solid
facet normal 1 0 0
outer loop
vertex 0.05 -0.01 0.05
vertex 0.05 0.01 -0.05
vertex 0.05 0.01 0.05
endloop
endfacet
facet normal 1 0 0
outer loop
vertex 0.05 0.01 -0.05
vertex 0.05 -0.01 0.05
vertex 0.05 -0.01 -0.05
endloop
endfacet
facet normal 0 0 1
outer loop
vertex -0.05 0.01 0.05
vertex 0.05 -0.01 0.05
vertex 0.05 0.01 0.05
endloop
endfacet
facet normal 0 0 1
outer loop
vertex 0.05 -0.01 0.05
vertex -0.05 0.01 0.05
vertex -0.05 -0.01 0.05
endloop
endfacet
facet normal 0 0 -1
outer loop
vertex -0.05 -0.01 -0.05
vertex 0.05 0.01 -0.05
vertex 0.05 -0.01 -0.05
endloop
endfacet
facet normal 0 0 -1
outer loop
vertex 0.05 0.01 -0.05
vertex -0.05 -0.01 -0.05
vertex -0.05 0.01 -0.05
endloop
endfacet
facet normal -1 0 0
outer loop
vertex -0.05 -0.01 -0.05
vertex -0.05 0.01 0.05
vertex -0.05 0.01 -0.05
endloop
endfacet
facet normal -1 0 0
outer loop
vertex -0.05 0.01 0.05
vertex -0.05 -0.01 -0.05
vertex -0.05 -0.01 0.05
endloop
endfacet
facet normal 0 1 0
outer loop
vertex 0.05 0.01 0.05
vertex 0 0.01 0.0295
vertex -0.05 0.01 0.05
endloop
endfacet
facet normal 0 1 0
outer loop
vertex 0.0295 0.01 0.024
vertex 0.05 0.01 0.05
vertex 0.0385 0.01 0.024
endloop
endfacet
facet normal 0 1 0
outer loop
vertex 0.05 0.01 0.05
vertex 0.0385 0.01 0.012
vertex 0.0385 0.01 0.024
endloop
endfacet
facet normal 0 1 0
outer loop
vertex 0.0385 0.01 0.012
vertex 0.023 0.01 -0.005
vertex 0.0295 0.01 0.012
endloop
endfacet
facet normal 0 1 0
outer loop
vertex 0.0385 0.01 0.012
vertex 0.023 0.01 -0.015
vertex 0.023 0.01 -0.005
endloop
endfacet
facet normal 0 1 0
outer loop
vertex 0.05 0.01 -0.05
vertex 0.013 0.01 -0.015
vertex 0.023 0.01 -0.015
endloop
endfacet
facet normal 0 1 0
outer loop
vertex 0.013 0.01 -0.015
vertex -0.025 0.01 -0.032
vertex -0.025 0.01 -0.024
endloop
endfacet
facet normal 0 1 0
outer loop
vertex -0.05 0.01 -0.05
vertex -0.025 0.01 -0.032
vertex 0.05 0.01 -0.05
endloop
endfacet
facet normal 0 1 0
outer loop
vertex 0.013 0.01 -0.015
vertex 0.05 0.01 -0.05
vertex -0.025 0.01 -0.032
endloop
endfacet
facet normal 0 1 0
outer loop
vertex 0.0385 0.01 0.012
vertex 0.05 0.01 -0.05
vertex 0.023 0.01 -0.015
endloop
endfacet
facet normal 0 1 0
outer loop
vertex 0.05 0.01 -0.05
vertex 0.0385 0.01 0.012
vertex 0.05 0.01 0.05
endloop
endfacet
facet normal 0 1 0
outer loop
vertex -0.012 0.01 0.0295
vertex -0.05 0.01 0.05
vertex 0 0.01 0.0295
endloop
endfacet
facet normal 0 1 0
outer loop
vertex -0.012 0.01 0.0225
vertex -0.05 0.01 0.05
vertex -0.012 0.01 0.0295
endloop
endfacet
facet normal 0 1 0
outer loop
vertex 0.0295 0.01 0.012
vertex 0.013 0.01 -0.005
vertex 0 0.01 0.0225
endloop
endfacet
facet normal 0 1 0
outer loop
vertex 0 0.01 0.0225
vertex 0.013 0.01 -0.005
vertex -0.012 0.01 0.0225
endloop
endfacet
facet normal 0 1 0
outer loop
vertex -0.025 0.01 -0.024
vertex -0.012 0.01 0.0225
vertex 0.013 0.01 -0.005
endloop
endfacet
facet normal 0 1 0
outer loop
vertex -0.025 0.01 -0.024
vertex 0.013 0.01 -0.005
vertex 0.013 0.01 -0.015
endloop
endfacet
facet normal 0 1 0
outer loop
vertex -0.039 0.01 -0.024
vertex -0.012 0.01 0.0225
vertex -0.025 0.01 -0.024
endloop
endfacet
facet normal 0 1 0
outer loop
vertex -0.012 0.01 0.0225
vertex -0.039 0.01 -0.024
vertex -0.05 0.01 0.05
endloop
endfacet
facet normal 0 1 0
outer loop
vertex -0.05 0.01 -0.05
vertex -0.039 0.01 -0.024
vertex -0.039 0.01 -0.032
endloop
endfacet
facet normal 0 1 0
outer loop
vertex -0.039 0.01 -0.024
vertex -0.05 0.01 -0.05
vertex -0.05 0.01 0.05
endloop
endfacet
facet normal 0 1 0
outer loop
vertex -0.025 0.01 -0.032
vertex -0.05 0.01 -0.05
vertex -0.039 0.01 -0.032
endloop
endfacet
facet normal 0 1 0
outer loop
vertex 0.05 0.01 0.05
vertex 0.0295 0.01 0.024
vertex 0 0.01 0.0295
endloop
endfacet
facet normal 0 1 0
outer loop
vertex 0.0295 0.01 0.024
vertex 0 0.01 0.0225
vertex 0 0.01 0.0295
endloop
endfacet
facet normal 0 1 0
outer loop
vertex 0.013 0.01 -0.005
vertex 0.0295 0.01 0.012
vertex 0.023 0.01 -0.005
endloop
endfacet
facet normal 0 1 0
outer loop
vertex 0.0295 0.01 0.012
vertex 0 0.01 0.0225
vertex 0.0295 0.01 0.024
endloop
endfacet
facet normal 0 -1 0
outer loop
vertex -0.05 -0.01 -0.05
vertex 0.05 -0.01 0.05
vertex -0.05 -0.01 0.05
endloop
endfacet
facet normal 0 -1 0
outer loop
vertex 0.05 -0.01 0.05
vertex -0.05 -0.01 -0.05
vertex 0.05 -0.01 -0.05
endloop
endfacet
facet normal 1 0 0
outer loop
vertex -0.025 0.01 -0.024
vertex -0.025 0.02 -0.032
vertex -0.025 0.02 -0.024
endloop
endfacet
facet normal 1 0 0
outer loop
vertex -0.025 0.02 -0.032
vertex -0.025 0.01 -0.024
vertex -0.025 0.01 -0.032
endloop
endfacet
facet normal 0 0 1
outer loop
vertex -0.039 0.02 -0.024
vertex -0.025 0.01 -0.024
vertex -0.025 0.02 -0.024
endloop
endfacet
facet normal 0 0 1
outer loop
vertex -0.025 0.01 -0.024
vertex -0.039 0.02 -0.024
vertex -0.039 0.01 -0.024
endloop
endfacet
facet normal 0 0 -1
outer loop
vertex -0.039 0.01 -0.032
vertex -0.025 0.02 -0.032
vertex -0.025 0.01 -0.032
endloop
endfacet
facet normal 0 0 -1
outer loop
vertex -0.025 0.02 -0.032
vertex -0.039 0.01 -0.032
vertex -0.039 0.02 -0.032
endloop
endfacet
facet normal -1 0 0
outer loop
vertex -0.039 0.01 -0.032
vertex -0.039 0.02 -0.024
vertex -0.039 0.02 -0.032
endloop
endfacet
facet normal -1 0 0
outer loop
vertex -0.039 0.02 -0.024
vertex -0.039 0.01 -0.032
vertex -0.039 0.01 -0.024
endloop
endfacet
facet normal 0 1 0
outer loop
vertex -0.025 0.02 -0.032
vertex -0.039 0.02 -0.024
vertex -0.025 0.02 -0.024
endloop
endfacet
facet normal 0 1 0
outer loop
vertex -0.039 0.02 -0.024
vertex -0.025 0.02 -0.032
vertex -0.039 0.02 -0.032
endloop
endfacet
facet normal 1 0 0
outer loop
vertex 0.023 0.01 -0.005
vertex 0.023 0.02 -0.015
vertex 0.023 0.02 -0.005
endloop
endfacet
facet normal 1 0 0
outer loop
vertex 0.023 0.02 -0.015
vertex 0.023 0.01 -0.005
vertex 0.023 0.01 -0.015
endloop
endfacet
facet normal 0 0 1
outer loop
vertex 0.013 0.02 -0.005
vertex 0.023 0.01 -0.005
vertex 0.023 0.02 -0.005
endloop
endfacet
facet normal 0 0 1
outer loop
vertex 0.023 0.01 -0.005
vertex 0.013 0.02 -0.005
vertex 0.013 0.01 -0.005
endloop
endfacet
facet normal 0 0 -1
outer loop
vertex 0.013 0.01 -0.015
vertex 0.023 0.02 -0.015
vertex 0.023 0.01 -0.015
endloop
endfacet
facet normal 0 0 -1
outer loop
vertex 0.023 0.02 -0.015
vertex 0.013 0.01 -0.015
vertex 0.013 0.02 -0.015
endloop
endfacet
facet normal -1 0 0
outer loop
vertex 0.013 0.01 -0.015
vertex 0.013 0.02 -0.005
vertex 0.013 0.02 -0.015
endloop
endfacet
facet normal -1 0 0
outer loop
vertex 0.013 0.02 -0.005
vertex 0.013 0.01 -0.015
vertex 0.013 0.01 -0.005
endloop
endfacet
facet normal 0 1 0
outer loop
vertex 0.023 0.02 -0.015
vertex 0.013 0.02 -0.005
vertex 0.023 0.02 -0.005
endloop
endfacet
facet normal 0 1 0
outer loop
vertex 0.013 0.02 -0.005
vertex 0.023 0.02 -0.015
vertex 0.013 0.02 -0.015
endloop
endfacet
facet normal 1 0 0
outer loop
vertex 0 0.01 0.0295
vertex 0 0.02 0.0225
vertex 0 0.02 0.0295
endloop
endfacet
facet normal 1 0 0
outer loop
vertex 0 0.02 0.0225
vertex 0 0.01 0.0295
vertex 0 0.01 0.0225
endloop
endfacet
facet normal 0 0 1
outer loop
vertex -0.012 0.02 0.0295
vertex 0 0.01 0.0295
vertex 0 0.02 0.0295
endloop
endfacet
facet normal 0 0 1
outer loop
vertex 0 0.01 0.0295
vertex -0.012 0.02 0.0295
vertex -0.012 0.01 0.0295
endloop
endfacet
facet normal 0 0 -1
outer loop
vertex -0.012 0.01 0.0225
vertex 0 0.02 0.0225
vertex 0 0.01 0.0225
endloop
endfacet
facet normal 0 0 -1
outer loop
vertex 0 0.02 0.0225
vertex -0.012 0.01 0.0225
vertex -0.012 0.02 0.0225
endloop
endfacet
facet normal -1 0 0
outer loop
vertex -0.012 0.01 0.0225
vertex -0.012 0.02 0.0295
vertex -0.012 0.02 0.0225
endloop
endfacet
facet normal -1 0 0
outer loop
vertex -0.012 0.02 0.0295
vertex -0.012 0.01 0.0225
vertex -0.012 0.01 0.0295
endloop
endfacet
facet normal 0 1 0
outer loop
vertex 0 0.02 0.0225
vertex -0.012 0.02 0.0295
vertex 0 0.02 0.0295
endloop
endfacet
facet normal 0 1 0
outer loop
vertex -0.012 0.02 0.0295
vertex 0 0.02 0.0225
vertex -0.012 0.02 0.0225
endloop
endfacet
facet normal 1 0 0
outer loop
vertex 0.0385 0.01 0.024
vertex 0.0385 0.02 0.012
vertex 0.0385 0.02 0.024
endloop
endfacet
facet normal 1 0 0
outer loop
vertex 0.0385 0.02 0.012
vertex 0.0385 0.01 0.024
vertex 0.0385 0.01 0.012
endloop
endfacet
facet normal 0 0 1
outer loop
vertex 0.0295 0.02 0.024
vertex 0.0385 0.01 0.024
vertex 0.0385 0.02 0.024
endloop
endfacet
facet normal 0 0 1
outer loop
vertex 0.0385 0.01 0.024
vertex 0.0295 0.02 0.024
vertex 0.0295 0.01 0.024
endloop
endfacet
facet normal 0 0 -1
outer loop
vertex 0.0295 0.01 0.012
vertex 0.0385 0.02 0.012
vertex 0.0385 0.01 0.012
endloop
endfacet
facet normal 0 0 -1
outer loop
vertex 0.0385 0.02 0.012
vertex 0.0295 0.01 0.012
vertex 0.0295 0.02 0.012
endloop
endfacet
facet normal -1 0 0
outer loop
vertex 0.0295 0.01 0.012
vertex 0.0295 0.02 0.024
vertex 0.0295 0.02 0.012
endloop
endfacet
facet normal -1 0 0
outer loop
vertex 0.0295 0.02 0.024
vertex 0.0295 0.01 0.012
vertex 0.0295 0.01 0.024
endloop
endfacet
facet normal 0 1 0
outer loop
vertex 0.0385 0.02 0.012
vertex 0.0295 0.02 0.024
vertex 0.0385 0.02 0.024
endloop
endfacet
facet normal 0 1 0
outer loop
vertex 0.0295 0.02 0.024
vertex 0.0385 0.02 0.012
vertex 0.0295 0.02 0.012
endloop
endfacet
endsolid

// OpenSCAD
$fn=64;

plate_x = 0.1;
plate_y = 0.02;
plate_z = 0.1;

boss_h = 0.01;
boss_x = 0.012;
boss_y = 0.008;

module boss(px, pz, sx=boss_x, sy=boss_y, h=boss_h){
    translate([px, plate_y/2 + h/2, pz])
        cube([sx, h, sy], center=true);
}

module plate(){
    cube([plate_x, plate_y, plate_z], center=true);
}

union(){
    plate();
    boss(-0.032, -0.028, sx=0.014, sy=0.008, h=0.010);
    boss( 0.018, -0.010, sx=0.010, sy=0.010, h=0.010);
    boss(-0.006,  0.026, sx=0.012, sy=0.007, h=0.010);
    boss( 0.034,  0.018, sx=0.009, sy=0.012, h=0.010);
}
